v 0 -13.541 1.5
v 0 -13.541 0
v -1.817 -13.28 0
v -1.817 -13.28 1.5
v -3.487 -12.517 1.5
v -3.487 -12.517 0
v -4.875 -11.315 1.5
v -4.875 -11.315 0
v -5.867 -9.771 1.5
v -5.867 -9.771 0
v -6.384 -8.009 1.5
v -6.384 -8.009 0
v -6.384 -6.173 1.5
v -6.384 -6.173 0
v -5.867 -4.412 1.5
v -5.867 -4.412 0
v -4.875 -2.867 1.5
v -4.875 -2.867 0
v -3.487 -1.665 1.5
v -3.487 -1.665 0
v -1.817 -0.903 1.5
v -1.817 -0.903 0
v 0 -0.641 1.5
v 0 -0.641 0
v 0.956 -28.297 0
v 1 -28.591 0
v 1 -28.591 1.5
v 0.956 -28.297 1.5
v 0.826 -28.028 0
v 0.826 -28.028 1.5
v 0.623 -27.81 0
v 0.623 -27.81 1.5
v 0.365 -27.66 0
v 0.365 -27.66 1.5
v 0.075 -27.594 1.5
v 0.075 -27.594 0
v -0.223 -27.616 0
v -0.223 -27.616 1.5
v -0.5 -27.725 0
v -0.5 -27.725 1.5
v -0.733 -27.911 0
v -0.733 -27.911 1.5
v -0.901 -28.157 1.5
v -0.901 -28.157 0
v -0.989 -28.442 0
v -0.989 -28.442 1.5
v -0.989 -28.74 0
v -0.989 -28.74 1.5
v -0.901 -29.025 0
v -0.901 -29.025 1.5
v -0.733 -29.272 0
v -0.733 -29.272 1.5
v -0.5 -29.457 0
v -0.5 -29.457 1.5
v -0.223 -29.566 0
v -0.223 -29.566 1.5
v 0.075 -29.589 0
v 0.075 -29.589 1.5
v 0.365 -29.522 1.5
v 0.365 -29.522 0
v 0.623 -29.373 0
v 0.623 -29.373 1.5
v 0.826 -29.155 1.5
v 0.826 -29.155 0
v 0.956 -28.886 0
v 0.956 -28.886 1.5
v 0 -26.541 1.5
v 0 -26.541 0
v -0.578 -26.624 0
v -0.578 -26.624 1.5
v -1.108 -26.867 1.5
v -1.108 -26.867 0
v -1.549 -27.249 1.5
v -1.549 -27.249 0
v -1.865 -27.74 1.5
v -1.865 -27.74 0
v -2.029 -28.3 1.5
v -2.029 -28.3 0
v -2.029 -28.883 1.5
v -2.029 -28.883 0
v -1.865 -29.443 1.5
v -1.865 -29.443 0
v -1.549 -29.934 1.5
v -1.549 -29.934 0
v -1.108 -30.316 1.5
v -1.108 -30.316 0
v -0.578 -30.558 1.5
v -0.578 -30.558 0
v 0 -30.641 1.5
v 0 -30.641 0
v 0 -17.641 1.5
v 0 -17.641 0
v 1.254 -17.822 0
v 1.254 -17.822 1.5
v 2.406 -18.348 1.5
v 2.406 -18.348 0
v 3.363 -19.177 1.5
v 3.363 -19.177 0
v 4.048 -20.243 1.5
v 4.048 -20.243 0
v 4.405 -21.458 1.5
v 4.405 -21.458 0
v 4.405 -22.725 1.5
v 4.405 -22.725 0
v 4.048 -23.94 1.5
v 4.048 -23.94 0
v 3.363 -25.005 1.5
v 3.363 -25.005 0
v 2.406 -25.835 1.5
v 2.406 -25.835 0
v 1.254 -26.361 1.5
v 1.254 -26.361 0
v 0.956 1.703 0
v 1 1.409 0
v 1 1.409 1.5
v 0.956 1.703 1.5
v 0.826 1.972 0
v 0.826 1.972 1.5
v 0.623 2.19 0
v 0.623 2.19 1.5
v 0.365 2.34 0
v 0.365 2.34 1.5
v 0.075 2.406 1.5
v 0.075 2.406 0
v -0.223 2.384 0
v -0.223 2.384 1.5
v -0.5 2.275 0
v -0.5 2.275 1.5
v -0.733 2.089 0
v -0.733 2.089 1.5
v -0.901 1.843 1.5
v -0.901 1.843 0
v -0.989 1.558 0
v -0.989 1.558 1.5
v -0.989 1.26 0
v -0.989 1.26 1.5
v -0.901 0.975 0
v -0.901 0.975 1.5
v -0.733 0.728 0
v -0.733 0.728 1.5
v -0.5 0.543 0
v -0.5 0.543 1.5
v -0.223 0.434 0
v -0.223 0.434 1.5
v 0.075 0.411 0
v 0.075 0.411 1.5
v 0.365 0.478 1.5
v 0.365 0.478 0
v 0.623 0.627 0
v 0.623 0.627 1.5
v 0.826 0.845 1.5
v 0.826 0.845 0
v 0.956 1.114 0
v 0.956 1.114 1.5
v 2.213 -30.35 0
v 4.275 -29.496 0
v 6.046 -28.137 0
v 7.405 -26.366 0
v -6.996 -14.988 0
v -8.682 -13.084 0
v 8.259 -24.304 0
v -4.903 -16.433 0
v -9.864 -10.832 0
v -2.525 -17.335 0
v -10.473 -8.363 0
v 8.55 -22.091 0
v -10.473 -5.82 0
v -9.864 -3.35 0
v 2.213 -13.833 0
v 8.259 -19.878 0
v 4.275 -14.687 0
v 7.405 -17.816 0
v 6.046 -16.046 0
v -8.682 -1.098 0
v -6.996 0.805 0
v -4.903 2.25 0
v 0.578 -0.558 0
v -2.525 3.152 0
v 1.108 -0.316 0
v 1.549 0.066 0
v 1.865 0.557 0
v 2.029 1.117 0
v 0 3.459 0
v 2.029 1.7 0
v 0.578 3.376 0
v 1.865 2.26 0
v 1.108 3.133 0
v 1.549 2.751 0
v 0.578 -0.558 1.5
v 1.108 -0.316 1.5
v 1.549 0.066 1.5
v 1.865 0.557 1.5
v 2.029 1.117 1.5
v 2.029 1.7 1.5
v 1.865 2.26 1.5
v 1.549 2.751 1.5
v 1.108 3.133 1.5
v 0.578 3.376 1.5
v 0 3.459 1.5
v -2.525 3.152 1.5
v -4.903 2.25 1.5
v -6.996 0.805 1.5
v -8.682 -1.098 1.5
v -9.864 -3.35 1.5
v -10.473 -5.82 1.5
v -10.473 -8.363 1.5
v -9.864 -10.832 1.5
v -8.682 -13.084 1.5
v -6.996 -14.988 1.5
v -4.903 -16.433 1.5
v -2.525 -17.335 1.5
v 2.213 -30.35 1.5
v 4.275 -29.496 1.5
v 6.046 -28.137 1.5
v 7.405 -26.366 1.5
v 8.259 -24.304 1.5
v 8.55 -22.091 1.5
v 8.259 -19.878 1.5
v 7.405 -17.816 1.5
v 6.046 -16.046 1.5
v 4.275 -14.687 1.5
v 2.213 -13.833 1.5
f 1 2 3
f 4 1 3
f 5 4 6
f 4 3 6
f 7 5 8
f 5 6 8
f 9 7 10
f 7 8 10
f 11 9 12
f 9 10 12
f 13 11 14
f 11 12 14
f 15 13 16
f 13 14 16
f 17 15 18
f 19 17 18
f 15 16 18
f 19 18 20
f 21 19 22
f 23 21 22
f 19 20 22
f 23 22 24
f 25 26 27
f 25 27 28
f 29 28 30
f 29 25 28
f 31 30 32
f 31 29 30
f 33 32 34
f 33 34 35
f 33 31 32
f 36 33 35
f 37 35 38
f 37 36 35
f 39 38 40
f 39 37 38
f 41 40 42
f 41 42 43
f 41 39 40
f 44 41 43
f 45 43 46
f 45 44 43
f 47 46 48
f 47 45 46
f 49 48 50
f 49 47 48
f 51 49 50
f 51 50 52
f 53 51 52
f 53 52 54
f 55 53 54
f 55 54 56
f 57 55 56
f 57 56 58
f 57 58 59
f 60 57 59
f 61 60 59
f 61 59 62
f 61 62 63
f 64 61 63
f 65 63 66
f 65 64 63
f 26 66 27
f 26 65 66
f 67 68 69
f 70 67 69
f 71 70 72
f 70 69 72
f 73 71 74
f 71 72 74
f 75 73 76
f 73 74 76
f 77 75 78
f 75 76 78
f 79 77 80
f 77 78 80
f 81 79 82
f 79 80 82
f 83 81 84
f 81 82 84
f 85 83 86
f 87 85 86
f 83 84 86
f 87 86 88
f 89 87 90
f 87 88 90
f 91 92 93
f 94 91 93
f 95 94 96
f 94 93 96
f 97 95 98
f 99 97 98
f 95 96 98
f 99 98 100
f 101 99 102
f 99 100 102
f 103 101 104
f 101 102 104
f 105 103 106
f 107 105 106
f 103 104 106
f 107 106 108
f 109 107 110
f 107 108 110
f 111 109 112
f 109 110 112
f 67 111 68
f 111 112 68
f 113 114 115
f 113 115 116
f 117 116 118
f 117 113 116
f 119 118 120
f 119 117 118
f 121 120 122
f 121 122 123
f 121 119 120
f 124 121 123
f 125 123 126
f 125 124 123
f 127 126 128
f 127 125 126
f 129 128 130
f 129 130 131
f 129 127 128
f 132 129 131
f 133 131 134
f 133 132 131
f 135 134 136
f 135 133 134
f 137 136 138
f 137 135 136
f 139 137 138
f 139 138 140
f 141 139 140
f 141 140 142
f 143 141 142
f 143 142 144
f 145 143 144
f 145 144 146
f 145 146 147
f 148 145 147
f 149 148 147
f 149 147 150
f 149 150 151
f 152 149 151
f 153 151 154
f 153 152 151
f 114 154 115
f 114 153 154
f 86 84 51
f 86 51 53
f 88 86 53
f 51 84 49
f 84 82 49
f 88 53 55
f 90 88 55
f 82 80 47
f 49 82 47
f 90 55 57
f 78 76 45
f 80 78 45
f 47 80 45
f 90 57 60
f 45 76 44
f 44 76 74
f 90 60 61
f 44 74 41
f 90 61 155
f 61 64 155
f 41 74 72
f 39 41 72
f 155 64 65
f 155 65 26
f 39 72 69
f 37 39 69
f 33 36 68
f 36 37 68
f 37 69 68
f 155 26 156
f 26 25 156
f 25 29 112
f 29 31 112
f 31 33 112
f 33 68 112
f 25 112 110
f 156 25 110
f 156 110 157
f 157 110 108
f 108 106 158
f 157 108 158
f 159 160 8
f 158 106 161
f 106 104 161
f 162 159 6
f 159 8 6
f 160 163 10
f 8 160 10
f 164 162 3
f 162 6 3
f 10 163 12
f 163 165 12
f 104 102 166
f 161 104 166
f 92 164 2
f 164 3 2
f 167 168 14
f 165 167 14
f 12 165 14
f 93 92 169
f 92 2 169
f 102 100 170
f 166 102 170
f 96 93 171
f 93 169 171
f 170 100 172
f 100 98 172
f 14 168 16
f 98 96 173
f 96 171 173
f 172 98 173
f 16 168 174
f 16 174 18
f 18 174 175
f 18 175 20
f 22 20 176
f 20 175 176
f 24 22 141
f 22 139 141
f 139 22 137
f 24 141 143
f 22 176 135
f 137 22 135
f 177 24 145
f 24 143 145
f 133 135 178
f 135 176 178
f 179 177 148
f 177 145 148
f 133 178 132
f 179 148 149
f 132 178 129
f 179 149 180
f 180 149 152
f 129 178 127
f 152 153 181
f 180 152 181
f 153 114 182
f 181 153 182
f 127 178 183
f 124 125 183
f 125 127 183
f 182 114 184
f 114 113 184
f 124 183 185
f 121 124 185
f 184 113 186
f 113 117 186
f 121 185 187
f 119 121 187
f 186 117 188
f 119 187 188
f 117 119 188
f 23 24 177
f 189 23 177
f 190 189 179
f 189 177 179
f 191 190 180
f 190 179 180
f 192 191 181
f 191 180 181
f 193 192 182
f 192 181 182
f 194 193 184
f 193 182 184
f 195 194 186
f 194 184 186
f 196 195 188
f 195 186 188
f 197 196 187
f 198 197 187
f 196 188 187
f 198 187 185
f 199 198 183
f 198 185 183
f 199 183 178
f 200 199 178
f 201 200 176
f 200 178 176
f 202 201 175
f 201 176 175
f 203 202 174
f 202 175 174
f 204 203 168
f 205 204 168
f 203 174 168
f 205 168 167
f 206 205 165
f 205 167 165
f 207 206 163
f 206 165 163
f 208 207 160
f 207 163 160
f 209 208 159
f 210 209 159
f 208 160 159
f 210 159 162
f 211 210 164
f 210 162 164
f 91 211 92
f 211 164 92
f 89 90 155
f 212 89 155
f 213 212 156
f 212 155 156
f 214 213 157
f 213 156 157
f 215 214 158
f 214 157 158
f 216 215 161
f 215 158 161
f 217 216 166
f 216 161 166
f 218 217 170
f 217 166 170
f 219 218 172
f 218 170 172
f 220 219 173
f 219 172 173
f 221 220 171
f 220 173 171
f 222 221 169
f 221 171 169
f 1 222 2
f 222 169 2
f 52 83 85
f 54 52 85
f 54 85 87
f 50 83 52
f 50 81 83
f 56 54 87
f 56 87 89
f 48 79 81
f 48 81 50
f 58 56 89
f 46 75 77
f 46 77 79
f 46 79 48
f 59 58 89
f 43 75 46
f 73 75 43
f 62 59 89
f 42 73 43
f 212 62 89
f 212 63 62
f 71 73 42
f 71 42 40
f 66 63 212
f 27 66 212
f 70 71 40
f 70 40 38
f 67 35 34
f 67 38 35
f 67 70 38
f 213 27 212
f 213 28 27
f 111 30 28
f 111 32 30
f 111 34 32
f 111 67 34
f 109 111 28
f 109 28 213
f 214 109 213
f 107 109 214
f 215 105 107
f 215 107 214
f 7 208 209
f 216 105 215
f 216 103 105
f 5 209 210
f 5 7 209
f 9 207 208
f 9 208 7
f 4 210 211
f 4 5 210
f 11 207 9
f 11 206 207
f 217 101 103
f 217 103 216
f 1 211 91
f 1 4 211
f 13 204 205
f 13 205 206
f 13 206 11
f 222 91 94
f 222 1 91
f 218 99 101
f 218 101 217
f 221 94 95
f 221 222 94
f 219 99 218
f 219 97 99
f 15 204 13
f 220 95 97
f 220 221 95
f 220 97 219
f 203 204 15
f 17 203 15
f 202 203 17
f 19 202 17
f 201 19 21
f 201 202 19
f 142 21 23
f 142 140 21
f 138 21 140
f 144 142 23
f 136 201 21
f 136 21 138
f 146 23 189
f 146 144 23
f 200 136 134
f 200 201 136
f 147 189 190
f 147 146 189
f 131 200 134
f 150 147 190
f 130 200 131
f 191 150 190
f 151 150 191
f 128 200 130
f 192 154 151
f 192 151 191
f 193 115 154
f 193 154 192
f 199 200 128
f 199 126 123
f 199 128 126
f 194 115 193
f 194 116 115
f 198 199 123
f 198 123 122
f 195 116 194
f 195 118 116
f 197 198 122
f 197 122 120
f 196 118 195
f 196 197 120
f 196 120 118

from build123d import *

# Parameters (mm, degrees)
SKETCH1_R           = 1
BOSS_EXTRUDE1_DEPTH = 1.5


with BuildPart() as part:
    # Sketch1 → Boss-Extrude1 (new body)
    with BuildSketch(Plane.XY):
        with BuildLine():
            ThreePointArc((0, 3.458652708), (-10.55, -7.091347292), (0, -17.641347292))
            ThreePointArc((0, -17.641347292), (4.45, -22.091347292), (0, -26.541347292))
            ThreePointArc((0, -26.541347292), (-2.05, -28.591347292), (0, -30.641347292))
            ThreePointArc((0, -30.641347292), (8.55, -22.091347292), (0, -13.541347292))
            ThreePointArc((0, -13.541347292), (-6.45, -7.091347292), (0, -0.641347292))
            ThreePointArc((0, -0.641347292), (2.05, 1.408652708), (0, 3.458652708))
        make_face()
        with Locations((0, 1.408652708)):
            Circle(SKETCH1_R, mode=Mode.SUBTRACT)
        with Locations((0, -28.591347292)):
            Circle(SKETCH1_R, mode=Mode.SUBTRACT)
    extrude(amount=BOSS_EXTRUDE1_DEPTH)


solid = part.part
